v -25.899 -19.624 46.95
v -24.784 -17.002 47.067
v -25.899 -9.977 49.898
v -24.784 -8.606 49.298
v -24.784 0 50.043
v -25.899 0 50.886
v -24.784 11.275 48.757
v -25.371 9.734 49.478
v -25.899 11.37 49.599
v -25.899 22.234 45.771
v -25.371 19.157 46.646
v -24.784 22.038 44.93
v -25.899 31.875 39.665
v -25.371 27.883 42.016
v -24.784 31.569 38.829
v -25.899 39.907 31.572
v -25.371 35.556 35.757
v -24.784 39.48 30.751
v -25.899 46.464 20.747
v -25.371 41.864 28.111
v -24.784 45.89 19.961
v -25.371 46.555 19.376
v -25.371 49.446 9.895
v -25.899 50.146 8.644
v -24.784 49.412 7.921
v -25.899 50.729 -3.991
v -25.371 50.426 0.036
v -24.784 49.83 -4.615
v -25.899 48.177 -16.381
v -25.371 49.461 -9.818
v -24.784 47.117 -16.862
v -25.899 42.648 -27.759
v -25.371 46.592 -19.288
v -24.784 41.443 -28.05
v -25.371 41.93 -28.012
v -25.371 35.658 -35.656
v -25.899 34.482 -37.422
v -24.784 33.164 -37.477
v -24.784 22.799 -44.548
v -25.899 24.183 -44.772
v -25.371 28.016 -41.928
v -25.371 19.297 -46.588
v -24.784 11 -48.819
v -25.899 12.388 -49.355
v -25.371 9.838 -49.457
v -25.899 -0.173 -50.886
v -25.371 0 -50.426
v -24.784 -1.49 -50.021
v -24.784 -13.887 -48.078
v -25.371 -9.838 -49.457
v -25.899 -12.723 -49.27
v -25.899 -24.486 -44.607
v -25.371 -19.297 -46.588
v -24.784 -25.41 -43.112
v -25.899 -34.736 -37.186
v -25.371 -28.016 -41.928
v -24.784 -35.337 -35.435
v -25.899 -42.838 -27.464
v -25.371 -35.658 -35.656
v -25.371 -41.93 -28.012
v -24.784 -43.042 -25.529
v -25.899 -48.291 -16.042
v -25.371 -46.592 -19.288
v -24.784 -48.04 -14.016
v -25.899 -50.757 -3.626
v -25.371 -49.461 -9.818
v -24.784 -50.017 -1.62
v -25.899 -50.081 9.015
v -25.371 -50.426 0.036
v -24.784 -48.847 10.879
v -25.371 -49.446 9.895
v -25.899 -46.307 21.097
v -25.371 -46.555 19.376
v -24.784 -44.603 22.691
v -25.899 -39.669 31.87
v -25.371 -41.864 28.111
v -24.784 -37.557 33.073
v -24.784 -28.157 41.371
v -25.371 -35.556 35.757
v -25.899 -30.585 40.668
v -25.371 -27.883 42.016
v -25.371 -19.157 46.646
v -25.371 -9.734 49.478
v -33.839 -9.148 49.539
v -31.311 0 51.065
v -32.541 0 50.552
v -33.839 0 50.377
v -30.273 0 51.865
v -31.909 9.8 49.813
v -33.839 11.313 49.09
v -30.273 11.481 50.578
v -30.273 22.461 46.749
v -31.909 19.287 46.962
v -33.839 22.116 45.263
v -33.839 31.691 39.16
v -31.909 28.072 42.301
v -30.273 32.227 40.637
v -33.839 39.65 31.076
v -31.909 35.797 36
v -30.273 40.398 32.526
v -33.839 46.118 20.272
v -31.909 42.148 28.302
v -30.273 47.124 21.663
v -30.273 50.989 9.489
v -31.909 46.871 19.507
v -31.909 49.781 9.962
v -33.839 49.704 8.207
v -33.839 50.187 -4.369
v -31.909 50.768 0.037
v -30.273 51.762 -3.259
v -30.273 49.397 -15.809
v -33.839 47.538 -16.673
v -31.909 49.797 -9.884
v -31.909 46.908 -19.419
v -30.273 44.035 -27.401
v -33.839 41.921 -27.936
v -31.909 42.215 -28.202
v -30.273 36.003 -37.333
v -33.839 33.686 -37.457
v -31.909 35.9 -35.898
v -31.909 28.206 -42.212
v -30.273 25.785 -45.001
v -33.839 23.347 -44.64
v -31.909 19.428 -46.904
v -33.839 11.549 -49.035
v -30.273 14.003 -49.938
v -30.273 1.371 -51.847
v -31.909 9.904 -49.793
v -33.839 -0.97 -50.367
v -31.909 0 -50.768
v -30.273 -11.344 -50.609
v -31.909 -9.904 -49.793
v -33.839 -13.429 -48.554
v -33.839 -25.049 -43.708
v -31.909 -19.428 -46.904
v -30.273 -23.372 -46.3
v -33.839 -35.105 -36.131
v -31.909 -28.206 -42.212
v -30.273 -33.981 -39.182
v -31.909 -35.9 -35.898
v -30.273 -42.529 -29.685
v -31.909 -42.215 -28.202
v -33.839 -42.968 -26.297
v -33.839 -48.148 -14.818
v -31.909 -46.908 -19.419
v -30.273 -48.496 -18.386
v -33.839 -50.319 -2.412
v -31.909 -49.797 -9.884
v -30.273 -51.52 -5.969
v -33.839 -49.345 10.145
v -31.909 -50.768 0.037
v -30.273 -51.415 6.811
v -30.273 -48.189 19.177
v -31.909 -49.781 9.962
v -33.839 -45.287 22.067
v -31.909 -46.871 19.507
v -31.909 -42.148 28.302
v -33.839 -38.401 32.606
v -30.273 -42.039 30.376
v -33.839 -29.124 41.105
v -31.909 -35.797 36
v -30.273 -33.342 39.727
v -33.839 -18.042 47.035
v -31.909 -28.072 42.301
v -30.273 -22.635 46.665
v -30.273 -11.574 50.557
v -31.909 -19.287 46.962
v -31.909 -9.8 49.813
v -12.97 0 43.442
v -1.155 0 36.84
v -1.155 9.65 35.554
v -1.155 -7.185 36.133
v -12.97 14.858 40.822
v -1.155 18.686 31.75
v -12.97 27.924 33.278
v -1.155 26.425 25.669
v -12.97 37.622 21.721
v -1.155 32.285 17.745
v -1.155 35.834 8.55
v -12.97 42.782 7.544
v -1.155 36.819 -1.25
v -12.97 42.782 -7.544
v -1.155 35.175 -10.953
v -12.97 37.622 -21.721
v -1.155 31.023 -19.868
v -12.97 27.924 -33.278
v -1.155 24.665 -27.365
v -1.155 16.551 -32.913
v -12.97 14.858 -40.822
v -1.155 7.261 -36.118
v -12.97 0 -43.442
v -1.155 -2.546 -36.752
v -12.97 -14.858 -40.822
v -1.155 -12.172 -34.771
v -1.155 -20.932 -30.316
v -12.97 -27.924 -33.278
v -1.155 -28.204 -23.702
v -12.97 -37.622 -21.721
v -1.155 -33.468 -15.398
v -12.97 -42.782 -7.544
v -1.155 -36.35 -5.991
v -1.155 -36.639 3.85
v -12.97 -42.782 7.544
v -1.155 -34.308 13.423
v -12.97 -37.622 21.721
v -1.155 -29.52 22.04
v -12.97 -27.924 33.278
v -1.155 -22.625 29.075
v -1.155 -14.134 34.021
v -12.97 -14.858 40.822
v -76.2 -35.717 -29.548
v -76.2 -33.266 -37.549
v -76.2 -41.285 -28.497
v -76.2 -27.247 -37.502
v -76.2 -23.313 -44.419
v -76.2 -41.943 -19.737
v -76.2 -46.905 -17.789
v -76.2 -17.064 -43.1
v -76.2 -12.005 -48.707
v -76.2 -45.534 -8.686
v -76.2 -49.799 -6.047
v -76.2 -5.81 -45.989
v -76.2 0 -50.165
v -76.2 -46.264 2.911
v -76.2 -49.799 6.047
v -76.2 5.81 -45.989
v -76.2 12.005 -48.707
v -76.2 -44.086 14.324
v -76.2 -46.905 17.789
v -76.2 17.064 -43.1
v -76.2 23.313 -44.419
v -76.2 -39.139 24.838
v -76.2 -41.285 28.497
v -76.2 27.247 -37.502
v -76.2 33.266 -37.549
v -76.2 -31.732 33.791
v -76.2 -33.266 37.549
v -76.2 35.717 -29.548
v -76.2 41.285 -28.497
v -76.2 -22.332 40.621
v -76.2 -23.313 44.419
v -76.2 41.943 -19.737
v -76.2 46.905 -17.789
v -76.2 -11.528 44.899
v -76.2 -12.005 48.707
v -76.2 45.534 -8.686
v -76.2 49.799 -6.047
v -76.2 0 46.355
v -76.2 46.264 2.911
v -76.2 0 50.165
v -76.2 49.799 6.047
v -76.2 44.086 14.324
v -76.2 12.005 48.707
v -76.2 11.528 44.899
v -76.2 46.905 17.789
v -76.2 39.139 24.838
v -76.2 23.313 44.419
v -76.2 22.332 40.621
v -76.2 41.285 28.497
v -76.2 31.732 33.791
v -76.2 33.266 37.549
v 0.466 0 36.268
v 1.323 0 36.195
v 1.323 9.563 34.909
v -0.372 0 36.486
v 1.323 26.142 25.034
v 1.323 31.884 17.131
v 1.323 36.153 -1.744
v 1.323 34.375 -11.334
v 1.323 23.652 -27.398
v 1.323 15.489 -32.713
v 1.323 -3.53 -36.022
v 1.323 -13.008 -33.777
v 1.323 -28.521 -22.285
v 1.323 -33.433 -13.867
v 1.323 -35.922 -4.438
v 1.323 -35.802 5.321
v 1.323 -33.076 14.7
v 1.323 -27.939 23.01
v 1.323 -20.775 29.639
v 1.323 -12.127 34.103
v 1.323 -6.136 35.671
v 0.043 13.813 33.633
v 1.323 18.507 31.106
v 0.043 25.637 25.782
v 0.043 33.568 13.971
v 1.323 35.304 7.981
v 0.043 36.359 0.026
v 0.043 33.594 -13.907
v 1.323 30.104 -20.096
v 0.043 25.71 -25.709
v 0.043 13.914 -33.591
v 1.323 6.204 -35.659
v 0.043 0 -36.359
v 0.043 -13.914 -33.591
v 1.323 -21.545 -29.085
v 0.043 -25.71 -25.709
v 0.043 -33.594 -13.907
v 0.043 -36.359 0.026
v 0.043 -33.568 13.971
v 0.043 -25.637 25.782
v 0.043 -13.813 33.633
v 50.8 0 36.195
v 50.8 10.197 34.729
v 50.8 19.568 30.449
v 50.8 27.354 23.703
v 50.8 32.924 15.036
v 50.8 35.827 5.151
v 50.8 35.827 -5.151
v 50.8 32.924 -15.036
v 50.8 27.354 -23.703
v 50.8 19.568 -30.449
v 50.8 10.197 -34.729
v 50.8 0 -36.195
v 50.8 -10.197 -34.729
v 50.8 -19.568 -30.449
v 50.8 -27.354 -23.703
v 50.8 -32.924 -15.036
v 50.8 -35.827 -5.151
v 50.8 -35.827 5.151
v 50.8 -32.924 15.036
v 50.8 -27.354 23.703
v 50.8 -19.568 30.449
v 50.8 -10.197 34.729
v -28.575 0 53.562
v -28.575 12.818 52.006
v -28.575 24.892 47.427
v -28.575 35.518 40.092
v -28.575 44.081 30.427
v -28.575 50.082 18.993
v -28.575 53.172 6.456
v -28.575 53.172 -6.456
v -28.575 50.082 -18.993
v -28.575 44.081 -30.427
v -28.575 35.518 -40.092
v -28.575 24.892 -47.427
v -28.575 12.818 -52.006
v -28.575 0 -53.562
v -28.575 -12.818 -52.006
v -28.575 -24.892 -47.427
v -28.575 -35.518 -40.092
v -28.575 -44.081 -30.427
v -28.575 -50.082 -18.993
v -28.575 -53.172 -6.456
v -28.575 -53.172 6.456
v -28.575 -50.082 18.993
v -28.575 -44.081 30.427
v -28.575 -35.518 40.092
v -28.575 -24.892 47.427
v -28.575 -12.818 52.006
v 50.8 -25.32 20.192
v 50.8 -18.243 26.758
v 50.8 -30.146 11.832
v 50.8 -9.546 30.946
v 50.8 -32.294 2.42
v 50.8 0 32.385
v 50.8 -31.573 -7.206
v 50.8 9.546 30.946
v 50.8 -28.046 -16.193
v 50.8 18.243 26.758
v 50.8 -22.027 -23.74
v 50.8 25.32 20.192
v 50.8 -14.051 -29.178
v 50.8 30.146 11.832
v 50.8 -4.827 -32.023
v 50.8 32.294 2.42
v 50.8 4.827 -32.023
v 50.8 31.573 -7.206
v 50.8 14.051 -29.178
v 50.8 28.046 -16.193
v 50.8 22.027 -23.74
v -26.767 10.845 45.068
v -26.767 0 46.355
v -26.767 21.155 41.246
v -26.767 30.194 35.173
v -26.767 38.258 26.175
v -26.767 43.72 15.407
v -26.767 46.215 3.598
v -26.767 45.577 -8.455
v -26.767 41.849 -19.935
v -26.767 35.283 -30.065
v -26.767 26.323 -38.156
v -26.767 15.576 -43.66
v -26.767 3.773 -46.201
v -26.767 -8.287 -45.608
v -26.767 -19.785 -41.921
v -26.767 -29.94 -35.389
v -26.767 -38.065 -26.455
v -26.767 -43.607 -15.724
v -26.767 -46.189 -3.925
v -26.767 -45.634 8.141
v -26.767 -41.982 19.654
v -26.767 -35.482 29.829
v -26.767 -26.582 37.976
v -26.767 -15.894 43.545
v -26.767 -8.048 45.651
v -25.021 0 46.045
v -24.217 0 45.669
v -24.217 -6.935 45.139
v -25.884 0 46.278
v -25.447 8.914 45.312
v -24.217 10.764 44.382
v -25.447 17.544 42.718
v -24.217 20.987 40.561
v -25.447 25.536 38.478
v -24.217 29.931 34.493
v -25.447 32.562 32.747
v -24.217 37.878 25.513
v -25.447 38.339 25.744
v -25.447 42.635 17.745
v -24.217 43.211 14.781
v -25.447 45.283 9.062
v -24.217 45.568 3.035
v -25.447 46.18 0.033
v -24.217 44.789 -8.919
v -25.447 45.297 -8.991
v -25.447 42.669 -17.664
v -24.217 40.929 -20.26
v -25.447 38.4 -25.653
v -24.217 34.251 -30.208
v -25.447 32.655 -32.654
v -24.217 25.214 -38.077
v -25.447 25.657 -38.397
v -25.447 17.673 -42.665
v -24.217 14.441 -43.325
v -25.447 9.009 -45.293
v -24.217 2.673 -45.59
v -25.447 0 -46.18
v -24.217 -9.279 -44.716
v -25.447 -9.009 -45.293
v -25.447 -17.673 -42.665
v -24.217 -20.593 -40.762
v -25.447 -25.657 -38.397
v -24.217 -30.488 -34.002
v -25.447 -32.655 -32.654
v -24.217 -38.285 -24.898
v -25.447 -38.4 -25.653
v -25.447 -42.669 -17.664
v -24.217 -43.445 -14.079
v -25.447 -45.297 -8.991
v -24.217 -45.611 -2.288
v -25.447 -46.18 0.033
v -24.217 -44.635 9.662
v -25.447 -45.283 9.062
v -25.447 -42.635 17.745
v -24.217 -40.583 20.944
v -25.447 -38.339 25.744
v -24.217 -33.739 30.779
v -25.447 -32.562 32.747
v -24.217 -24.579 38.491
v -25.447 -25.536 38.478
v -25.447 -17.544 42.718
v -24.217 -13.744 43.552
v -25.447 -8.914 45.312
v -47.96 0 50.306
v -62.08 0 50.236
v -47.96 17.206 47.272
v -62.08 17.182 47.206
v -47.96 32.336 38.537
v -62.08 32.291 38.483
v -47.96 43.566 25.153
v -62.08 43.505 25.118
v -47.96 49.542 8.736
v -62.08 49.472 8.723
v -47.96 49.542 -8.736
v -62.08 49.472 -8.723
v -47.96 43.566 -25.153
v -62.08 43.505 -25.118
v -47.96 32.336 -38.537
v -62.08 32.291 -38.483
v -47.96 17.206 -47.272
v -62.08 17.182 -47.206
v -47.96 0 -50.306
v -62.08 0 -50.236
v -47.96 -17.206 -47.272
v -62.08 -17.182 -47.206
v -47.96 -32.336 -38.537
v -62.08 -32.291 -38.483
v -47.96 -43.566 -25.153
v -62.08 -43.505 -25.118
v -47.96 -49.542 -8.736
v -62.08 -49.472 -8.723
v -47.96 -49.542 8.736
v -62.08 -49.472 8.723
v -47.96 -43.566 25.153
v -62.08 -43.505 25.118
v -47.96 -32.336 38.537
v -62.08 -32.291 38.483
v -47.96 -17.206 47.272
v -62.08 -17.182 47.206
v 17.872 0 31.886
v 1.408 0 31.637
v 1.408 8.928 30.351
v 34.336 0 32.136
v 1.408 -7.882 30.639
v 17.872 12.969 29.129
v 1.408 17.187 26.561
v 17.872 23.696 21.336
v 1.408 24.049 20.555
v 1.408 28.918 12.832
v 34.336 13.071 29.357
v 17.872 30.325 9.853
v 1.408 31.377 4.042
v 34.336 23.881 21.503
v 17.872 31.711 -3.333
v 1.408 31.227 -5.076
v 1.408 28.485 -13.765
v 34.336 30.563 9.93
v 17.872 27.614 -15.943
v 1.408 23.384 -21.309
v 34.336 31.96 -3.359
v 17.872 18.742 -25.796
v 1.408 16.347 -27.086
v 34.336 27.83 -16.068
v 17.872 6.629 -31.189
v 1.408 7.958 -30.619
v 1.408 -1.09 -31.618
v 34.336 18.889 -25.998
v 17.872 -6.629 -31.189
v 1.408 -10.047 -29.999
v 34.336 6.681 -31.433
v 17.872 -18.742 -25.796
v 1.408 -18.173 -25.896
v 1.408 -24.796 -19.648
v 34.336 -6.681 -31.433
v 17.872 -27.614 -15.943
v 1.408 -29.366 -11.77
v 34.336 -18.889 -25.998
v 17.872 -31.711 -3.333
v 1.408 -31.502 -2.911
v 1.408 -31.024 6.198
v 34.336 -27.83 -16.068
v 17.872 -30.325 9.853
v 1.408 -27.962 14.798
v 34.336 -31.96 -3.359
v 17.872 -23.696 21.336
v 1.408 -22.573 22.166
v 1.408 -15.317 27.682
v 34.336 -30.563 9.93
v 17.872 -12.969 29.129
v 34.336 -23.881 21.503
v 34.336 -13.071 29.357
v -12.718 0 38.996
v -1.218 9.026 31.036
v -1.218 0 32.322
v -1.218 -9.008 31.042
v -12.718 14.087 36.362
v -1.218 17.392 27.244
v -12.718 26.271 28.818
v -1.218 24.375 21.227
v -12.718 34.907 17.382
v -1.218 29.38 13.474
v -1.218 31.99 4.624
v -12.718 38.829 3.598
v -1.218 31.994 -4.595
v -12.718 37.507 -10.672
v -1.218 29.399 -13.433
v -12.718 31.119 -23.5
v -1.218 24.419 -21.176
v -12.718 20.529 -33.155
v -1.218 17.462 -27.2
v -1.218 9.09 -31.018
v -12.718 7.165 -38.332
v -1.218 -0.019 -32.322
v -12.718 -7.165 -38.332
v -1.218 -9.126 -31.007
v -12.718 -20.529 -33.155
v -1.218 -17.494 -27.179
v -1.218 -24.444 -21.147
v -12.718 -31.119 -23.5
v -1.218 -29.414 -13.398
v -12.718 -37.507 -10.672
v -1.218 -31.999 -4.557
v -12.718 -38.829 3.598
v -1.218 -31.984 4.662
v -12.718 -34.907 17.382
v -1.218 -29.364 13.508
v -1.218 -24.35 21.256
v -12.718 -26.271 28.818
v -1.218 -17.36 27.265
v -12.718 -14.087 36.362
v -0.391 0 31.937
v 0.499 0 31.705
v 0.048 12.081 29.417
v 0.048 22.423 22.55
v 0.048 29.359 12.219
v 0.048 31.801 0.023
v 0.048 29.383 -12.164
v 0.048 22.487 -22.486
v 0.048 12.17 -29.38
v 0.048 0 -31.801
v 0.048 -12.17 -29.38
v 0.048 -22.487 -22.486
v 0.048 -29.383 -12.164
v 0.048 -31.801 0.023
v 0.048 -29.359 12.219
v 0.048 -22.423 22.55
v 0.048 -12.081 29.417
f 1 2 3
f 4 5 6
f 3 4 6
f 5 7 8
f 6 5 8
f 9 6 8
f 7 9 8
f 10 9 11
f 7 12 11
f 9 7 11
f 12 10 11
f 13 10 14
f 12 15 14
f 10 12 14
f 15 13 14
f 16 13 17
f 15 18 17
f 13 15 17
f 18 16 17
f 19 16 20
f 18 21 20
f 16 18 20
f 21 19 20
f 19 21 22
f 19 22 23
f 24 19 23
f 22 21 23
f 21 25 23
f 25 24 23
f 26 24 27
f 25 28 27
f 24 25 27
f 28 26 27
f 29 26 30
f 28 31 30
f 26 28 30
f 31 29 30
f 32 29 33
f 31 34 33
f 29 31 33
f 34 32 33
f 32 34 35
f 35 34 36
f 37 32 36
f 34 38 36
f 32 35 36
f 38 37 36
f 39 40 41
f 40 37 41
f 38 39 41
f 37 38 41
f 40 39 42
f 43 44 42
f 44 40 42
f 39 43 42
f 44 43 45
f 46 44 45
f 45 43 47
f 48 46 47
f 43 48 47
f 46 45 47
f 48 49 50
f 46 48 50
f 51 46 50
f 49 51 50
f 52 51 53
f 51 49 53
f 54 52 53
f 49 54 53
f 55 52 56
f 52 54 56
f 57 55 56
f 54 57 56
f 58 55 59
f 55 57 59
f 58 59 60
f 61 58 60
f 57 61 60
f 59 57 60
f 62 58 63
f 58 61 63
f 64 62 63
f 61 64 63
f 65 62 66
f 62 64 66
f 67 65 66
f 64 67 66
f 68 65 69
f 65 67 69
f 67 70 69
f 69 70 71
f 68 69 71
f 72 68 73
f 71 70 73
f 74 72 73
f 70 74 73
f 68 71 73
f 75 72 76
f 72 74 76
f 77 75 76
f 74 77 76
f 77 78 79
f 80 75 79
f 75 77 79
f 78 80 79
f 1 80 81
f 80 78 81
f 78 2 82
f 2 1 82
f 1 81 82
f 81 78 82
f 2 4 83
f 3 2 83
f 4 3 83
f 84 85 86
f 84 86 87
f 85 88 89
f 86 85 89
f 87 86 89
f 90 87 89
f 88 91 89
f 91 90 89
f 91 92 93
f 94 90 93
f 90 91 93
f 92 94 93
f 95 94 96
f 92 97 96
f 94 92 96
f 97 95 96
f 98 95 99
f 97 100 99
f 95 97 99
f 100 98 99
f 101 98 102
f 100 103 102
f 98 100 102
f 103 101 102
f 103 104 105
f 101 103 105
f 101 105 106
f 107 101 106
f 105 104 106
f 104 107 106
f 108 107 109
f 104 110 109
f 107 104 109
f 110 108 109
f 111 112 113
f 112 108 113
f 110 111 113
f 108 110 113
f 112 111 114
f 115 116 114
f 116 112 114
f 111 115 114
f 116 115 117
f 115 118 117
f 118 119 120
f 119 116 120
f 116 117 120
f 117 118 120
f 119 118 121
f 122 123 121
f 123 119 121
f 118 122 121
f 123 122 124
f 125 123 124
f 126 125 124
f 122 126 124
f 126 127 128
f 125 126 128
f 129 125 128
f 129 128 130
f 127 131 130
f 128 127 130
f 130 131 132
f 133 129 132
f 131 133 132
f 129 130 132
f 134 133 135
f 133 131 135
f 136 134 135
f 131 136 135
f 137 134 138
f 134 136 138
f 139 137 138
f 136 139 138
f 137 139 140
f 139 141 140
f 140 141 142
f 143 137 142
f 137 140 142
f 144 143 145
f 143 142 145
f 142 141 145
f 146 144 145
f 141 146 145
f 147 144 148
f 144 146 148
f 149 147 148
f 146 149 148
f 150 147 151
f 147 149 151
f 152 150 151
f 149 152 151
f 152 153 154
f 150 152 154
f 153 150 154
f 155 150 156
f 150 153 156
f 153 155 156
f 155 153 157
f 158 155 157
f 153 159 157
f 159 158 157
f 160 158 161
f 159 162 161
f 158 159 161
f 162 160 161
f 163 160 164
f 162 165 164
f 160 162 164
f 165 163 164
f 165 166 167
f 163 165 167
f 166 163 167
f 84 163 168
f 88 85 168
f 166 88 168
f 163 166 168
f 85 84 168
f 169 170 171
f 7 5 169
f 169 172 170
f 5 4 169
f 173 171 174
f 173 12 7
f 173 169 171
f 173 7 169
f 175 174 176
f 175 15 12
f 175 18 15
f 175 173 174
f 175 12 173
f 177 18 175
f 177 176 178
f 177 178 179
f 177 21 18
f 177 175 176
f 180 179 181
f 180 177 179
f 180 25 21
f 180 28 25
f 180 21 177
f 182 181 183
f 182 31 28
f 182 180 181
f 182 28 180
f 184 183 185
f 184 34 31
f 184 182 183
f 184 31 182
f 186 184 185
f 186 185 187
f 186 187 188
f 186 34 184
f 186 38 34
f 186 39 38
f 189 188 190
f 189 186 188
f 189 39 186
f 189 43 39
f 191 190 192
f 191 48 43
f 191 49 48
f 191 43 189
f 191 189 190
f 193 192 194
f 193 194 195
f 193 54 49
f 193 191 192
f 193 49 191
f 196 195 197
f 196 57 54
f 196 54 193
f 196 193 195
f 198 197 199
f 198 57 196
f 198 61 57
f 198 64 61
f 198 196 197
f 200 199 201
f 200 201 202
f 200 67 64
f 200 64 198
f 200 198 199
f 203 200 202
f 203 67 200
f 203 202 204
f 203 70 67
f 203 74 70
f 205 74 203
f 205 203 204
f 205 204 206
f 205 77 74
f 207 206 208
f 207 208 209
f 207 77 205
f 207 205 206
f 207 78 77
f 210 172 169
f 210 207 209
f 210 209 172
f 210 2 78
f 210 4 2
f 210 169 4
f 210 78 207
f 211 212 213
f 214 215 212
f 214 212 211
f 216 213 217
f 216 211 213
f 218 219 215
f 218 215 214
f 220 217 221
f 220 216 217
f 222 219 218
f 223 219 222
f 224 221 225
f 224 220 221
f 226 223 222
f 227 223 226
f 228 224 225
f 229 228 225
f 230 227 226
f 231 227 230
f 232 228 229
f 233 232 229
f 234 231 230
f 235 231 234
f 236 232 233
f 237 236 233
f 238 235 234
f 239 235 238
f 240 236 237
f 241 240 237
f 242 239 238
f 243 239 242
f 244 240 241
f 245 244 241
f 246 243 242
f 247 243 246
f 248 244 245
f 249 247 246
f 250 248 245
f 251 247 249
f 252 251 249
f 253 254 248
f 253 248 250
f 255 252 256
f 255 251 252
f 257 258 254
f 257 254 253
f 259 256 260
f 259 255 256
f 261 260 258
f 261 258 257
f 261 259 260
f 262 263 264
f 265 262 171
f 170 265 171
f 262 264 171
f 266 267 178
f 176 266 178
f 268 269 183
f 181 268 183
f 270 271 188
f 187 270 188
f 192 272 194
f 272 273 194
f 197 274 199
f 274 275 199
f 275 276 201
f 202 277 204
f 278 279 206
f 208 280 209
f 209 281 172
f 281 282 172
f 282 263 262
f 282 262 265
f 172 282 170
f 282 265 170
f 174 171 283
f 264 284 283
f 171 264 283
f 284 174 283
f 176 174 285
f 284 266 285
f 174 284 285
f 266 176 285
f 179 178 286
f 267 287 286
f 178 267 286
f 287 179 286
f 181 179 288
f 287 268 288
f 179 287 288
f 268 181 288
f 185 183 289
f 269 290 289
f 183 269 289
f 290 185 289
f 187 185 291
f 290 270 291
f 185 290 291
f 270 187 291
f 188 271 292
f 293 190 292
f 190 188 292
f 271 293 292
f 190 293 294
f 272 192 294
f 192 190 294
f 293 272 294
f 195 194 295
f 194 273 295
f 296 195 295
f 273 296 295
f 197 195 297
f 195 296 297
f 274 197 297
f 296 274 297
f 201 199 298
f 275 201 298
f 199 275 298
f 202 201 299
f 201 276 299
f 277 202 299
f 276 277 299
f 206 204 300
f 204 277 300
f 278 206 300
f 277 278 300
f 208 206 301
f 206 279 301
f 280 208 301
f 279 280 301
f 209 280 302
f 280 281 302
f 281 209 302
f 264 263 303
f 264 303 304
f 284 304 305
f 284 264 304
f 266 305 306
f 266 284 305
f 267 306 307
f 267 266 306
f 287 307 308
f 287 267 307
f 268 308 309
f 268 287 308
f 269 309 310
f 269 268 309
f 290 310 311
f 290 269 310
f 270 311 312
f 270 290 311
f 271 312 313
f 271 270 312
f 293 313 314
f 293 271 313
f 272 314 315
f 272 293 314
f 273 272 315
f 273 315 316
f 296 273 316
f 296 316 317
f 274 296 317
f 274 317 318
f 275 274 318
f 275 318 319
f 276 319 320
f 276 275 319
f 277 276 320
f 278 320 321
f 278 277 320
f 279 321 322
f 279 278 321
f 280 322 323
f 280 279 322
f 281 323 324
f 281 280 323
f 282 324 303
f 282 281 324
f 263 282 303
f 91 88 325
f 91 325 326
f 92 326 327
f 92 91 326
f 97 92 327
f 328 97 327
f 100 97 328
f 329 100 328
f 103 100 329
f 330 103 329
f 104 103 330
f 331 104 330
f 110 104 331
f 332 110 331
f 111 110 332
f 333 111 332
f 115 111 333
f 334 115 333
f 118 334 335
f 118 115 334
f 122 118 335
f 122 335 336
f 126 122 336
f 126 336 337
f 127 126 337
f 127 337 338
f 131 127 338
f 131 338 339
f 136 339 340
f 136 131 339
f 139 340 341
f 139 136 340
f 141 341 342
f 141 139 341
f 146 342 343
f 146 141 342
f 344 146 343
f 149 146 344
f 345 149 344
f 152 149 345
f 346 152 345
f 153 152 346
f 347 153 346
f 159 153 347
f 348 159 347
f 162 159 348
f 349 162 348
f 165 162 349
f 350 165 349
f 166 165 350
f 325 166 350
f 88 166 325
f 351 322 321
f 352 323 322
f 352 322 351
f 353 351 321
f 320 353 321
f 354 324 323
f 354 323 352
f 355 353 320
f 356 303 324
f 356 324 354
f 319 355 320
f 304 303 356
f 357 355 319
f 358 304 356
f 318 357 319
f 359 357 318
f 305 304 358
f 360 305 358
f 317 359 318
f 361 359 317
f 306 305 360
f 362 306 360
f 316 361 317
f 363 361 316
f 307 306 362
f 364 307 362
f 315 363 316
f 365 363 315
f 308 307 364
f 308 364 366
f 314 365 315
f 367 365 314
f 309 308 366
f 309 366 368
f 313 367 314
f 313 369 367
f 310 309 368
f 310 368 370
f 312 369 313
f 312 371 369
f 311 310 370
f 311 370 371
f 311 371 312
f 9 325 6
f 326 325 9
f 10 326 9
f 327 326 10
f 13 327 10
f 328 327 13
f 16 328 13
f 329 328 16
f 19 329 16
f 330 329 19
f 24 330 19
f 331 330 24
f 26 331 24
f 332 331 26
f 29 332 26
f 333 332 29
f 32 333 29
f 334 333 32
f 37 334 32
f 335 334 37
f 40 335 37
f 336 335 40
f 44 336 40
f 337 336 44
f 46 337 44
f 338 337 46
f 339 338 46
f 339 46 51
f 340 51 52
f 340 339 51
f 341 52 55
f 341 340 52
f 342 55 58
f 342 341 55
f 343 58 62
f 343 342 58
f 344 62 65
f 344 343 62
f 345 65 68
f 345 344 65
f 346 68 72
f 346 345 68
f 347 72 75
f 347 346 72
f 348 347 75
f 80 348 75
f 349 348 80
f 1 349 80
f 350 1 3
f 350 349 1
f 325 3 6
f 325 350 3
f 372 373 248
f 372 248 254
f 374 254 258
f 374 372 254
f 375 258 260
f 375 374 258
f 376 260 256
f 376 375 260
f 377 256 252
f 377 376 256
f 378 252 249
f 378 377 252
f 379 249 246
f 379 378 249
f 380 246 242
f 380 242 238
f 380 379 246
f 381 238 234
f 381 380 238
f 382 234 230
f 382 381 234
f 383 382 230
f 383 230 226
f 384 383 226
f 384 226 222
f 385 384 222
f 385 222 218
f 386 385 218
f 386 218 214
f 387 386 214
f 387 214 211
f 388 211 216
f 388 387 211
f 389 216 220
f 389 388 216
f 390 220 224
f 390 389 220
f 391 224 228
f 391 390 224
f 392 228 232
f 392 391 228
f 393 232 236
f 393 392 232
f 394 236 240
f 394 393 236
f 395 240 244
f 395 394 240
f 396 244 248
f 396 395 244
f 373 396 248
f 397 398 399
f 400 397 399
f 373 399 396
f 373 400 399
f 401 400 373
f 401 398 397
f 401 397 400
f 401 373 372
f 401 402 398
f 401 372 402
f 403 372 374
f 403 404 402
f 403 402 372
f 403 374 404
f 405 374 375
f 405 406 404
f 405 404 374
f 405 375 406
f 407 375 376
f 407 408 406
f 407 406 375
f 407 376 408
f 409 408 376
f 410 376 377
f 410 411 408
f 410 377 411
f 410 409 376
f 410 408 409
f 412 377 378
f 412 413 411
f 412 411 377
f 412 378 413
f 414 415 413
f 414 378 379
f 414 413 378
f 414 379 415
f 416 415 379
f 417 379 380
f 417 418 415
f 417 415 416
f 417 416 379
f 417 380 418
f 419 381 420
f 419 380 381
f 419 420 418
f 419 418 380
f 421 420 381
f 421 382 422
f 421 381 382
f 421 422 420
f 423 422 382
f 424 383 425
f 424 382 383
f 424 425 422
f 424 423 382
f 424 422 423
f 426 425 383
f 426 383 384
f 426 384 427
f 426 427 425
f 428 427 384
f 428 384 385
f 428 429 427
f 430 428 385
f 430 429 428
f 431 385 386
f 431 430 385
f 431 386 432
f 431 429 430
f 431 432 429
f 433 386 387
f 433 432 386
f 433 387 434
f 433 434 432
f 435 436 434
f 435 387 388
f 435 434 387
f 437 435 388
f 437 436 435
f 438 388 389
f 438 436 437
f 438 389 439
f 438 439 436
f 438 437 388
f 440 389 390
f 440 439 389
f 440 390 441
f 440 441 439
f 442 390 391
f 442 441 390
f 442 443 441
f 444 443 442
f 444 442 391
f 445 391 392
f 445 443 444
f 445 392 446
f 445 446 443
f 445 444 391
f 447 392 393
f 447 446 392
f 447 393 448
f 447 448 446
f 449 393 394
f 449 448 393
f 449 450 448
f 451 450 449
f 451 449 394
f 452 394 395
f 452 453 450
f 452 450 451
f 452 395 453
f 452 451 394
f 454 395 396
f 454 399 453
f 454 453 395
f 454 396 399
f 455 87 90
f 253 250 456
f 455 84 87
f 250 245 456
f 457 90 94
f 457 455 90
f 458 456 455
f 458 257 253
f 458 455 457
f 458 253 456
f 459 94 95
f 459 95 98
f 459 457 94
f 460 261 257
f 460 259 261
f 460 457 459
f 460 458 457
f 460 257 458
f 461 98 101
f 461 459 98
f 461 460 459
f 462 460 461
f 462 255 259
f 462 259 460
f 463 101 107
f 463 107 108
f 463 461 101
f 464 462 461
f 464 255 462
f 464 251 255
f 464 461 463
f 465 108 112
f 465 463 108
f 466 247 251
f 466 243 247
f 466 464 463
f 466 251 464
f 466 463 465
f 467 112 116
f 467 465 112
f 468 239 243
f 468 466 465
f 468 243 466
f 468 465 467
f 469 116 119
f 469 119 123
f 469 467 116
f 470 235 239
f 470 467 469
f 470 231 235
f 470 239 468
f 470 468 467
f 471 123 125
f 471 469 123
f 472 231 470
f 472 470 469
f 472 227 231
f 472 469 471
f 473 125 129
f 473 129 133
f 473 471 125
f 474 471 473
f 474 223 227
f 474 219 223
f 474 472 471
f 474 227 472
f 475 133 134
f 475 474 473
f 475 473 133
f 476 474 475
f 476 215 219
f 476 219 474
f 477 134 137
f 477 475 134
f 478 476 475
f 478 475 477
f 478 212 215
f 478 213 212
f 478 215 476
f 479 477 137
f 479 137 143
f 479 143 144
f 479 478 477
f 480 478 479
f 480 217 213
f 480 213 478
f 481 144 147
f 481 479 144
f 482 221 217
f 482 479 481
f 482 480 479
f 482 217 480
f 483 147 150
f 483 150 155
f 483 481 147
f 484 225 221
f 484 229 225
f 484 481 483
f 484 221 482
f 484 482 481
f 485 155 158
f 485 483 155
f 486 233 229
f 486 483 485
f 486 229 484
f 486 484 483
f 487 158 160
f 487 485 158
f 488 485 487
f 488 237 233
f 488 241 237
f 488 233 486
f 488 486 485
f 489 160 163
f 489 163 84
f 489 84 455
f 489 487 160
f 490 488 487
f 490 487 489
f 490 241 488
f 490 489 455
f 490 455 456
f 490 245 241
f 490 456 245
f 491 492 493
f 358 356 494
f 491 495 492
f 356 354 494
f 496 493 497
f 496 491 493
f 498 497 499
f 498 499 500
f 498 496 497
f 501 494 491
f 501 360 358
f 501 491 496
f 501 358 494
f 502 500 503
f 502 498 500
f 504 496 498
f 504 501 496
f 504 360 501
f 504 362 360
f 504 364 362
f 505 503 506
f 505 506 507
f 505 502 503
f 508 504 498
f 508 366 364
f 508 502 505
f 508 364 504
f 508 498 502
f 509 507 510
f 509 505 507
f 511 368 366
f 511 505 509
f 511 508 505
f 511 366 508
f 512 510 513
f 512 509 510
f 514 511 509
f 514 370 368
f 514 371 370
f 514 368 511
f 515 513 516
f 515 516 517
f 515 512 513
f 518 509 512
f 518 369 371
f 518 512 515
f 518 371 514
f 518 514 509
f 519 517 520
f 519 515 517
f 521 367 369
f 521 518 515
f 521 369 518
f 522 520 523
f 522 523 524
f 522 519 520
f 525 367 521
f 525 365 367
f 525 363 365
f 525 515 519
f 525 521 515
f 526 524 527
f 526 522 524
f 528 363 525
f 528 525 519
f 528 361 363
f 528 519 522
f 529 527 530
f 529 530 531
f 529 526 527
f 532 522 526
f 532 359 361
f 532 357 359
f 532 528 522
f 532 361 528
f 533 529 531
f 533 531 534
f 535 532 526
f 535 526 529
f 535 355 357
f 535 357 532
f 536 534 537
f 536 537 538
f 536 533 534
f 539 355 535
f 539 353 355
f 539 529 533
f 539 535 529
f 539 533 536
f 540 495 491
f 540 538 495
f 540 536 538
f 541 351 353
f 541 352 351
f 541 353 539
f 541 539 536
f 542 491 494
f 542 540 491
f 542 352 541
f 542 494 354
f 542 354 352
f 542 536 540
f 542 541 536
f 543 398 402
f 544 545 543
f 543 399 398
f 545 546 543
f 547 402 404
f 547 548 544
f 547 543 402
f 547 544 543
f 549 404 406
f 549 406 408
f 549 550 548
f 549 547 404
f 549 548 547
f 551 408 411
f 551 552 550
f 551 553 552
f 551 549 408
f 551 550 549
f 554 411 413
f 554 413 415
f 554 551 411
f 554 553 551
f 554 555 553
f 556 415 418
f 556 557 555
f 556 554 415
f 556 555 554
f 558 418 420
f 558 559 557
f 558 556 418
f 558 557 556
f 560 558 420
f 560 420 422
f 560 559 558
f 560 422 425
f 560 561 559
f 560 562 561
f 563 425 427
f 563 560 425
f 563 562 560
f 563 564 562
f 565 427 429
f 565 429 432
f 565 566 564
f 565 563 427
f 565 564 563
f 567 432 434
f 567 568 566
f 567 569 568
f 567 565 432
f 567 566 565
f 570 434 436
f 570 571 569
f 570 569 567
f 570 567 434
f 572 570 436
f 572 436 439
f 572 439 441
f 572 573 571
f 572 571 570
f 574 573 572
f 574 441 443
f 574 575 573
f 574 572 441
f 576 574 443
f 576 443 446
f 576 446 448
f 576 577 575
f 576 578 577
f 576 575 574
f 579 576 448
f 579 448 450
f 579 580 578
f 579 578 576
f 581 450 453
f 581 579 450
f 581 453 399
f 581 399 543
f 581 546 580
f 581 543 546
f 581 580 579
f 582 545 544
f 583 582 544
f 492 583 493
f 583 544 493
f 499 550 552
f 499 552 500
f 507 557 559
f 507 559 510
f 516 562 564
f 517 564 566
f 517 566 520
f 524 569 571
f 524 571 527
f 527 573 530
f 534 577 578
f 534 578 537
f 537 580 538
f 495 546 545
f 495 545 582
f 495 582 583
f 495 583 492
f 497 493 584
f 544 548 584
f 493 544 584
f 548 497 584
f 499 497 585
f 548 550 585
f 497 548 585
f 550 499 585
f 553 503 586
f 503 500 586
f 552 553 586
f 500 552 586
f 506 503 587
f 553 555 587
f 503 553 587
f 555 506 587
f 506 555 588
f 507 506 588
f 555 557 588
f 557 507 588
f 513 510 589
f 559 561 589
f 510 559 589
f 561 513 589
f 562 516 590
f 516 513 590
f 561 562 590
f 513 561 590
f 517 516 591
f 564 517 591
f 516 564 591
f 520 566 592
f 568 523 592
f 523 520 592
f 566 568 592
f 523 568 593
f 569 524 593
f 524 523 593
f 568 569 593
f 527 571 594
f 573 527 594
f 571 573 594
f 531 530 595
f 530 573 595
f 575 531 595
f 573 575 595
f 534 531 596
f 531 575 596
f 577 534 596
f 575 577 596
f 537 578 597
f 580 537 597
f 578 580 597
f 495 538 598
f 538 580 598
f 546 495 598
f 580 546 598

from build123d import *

# Parameters (mm, degrees)
F3_R = 5.08


# Not quite as in the source:
# - a variable given as a bare number and used for a length is read in inches; the dataset says mm whatever the document's units were


with BuildPart() as f2:
    # F1 (on Front) → F2 (revolve)
    with BuildSketch(Plane.XZ):
        Polygon((-25.4, 46.355), (0, 31.6153030303), (50.8, 32.385), (50.8, 36.195), (0, 36.195), (-25.4, 50.38725), (-28.575, 53.56225), (-31.75, 50.38725), (-76.2, 50.165), (-76.2, 46.355), align=None)
    revolve(axis=Axis((-24.3991323134, 0, 0), (-1, 0, 0)))

    # F3
    f3_edges = [f2.edges().sort_by_distance(p)[0] for p in [
        (-25.4, 0, -46.355),
        (0, 0, -31.615303),
        (0, 0, -36.195),
        (-31.75, 0, -50.38725),
        (-25.4, 0, -50.38725),
    ]]
    fillet(f3_edges, radius=F3_R)


solid = f2.part
